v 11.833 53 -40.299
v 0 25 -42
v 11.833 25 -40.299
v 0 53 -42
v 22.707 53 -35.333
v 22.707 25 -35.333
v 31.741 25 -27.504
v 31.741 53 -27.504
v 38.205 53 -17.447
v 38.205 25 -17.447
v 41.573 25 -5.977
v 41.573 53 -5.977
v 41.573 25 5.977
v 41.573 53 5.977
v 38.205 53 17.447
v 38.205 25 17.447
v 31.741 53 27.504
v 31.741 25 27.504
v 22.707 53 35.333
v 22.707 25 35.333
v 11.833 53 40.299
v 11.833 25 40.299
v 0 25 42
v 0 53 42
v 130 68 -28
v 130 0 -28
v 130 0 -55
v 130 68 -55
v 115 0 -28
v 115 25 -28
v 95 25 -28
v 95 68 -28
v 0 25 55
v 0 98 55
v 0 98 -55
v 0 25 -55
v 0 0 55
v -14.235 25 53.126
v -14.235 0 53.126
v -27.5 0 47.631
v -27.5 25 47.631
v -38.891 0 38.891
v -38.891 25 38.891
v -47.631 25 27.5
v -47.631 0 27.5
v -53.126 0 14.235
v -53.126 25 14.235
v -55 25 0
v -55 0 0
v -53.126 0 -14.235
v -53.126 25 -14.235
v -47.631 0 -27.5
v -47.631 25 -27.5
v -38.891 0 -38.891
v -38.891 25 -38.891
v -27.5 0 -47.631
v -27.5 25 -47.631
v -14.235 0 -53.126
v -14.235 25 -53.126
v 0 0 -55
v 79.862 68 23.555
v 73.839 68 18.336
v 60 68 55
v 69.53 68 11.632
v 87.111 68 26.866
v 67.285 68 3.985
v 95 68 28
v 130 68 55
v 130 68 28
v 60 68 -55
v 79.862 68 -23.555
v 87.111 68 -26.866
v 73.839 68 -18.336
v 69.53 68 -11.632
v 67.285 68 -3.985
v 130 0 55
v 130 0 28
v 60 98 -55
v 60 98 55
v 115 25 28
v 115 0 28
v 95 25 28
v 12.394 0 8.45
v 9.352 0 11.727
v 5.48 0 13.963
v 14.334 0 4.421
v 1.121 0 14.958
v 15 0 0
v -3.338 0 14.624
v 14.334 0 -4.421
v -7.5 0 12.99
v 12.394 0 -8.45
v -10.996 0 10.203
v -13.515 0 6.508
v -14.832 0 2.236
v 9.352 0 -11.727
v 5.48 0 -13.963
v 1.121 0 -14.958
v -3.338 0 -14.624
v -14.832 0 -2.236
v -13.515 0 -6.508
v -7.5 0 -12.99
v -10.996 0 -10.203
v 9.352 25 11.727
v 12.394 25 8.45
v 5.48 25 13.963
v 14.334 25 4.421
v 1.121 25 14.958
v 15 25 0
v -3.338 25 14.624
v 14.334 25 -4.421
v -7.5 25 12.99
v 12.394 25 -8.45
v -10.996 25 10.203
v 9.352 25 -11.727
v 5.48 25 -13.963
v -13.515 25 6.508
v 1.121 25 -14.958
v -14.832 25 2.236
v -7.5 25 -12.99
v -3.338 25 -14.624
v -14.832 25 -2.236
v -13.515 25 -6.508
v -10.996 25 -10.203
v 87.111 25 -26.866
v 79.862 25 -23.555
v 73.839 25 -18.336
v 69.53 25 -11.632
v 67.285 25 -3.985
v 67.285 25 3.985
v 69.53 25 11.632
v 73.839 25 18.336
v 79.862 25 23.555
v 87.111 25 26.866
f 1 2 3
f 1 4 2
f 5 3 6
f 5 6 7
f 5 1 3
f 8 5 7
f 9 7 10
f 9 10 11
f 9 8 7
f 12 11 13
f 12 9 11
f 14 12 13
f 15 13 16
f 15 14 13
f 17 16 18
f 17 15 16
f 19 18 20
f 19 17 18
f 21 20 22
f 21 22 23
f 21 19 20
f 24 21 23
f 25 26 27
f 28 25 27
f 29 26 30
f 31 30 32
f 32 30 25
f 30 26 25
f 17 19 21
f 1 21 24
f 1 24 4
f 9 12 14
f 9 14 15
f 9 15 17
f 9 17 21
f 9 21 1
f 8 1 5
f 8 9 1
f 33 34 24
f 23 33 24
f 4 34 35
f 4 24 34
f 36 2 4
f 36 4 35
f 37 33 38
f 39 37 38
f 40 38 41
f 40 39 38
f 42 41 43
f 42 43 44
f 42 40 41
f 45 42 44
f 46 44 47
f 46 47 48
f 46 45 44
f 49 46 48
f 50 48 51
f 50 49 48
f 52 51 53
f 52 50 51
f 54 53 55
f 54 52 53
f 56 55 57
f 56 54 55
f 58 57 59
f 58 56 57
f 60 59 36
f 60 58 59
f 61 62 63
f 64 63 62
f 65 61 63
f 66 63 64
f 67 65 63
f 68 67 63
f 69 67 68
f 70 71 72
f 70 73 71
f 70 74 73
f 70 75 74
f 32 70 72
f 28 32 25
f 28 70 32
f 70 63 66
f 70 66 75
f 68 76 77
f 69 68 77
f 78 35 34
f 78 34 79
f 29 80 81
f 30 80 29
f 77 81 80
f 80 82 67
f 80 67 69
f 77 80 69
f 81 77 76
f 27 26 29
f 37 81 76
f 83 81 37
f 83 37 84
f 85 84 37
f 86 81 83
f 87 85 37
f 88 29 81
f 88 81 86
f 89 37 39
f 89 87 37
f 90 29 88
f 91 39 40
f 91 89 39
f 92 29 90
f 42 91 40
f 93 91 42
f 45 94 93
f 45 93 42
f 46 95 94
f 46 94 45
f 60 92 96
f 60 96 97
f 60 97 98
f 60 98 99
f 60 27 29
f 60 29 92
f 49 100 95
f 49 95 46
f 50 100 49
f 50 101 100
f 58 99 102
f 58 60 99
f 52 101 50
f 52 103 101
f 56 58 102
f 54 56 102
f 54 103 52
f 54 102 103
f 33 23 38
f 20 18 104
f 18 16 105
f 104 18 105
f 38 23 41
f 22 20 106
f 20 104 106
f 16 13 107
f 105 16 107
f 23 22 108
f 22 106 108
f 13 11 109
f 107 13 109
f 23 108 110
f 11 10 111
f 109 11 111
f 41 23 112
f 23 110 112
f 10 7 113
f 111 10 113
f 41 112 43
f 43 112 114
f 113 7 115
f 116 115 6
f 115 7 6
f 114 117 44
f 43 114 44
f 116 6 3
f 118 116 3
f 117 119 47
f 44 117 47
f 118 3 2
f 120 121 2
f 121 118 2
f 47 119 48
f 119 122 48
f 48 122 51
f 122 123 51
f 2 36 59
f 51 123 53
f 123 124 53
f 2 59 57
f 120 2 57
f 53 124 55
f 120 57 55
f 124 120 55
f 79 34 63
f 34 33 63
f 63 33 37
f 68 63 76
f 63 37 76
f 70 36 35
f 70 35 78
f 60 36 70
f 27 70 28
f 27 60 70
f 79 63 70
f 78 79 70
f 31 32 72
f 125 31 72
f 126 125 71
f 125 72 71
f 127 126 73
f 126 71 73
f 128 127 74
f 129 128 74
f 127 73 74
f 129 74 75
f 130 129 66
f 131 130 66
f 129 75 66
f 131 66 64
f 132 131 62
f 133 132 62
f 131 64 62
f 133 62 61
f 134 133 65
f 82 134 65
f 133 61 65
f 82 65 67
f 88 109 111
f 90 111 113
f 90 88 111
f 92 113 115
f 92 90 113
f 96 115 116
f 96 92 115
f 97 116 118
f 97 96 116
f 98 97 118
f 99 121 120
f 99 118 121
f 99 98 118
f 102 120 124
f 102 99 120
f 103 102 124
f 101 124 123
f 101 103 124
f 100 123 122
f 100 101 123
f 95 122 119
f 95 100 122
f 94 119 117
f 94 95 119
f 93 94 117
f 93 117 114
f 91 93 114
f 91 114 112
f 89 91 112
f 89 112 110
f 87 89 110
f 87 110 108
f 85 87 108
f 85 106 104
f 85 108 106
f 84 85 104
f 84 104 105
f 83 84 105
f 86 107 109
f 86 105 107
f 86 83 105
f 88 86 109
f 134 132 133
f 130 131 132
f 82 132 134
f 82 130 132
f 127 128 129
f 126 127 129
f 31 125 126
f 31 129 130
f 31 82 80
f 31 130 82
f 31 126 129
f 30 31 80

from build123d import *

# Parameters (mm, degrees)
SKETCH1_R           = 15
BOSS_EXTRUDE1_DEPTH = 25
SKETCH3_W           = 130
SKETCH3_H           = 110
BOSS_EXTRUDE2_DEPTH = 43
SKETCH4_W           = 60
SKETCH4_H           = 110
BOSS_EXTRUDE3_DEPTH = 30
SKETCH5_W           = 42
SKETCH5_H           = 28
CUT_REVOLVE1_ANGLE  = 180
SKETCH6_W           = 56
SKETCH6_H           = 68
CUT_EXTRUDE1_DEPTH  = 15
CUT_EXTRUDE2_DEPTH  = 43


with BuildPart() as part:
    # Sketch1 → Boss-Extrude1 (new body)
    with BuildSketch(Plane(origin=(0, 0, 0), x_dir=(1, 0, 0), z_dir=(0, 1, 0))):
        with BuildLine():
            Line((0, 55), (130, 55))
            Line((130, 55), (130, -55))
            Line((130, -55), (0, -55))
            ThreePointArc((0, -55), (-55, 0), (0, 55))
        make_face()
        Circle(SKETCH1_R, mode=Mode.SUBTRACT)
    extrude(amount=BOSS_EXTRUDE1_DEPTH)

    # Sketch3 → Boss-Extrude2 (add)
    with BuildSketch(Plane(origin=(0, 25, 0), x_dir=(1, 0, 0), z_dir=(0, 1, 0))):
        with Locations((65, 0)):
            Rectangle(SKETCH3_W, SKETCH3_H)
    extrude(amount=BOSS_EXTRUDE2_DEPTH)

    # Sketch4 → Boss-Extrude3 (add)
    with BuildSketch(Plane(origin=(0, 68, 0), x_dir=(1, 0, 0), z_dir=(0, 1, 0))):
        with Locations((30, 0)):
            Rectangle(SKETCH4_W, SKETCH4_H)
    extrude(amount=BOSS_EXTRUDE3_DEPTH)

    # Sketch5 → Cut-Revolve1 (revolve, cut)
    with BuildSketch(Plane.ZY):
        with Locations((-21, 39)):
            Rectangle(SKETCH5_W, SKETCH5_H)
    revolve(axis=Axis((0, 0, 0), (0, -1, 0)), revolution_arc=CUT_REVOLVE1_ANGLE, mode=Mode.SUBTRACT)

    # Sketch6 → Cut-Extrude1 (cut)
    with BuildSketch(Plane(origin=(130, 0, 0), x_dir=(0, 0, -1), z_dir=(1, 0, 0))):
        with Locations((0, 34)):
            Rectangle(SKETCH6_W, SKETCH6_H)
    extrude(amount=-CUT_EXTRUDE1_DEPTH, mode=Mode.SUBTRACT)

    # Sketch7 → Cut-Extrude2 (cut)
    with BuildSketch(Plane(origin=(0, 68, 0), x_dir=(1, 0, 0), z_dir=(0, 1, 0))):
        with BuildLine():
            Line((115, 28), (95, 28))
            ThreePointArc((95, 28), (67, 0), (95, -28))
            Line((95, -28), (115, -28))
            Line((115, -28), (115, 28))
        make_face()
    extrude(amount=-CUT_EXTRUDE2_DEPTH, mode=Mode.SUBTRACT)


solid = part.part
